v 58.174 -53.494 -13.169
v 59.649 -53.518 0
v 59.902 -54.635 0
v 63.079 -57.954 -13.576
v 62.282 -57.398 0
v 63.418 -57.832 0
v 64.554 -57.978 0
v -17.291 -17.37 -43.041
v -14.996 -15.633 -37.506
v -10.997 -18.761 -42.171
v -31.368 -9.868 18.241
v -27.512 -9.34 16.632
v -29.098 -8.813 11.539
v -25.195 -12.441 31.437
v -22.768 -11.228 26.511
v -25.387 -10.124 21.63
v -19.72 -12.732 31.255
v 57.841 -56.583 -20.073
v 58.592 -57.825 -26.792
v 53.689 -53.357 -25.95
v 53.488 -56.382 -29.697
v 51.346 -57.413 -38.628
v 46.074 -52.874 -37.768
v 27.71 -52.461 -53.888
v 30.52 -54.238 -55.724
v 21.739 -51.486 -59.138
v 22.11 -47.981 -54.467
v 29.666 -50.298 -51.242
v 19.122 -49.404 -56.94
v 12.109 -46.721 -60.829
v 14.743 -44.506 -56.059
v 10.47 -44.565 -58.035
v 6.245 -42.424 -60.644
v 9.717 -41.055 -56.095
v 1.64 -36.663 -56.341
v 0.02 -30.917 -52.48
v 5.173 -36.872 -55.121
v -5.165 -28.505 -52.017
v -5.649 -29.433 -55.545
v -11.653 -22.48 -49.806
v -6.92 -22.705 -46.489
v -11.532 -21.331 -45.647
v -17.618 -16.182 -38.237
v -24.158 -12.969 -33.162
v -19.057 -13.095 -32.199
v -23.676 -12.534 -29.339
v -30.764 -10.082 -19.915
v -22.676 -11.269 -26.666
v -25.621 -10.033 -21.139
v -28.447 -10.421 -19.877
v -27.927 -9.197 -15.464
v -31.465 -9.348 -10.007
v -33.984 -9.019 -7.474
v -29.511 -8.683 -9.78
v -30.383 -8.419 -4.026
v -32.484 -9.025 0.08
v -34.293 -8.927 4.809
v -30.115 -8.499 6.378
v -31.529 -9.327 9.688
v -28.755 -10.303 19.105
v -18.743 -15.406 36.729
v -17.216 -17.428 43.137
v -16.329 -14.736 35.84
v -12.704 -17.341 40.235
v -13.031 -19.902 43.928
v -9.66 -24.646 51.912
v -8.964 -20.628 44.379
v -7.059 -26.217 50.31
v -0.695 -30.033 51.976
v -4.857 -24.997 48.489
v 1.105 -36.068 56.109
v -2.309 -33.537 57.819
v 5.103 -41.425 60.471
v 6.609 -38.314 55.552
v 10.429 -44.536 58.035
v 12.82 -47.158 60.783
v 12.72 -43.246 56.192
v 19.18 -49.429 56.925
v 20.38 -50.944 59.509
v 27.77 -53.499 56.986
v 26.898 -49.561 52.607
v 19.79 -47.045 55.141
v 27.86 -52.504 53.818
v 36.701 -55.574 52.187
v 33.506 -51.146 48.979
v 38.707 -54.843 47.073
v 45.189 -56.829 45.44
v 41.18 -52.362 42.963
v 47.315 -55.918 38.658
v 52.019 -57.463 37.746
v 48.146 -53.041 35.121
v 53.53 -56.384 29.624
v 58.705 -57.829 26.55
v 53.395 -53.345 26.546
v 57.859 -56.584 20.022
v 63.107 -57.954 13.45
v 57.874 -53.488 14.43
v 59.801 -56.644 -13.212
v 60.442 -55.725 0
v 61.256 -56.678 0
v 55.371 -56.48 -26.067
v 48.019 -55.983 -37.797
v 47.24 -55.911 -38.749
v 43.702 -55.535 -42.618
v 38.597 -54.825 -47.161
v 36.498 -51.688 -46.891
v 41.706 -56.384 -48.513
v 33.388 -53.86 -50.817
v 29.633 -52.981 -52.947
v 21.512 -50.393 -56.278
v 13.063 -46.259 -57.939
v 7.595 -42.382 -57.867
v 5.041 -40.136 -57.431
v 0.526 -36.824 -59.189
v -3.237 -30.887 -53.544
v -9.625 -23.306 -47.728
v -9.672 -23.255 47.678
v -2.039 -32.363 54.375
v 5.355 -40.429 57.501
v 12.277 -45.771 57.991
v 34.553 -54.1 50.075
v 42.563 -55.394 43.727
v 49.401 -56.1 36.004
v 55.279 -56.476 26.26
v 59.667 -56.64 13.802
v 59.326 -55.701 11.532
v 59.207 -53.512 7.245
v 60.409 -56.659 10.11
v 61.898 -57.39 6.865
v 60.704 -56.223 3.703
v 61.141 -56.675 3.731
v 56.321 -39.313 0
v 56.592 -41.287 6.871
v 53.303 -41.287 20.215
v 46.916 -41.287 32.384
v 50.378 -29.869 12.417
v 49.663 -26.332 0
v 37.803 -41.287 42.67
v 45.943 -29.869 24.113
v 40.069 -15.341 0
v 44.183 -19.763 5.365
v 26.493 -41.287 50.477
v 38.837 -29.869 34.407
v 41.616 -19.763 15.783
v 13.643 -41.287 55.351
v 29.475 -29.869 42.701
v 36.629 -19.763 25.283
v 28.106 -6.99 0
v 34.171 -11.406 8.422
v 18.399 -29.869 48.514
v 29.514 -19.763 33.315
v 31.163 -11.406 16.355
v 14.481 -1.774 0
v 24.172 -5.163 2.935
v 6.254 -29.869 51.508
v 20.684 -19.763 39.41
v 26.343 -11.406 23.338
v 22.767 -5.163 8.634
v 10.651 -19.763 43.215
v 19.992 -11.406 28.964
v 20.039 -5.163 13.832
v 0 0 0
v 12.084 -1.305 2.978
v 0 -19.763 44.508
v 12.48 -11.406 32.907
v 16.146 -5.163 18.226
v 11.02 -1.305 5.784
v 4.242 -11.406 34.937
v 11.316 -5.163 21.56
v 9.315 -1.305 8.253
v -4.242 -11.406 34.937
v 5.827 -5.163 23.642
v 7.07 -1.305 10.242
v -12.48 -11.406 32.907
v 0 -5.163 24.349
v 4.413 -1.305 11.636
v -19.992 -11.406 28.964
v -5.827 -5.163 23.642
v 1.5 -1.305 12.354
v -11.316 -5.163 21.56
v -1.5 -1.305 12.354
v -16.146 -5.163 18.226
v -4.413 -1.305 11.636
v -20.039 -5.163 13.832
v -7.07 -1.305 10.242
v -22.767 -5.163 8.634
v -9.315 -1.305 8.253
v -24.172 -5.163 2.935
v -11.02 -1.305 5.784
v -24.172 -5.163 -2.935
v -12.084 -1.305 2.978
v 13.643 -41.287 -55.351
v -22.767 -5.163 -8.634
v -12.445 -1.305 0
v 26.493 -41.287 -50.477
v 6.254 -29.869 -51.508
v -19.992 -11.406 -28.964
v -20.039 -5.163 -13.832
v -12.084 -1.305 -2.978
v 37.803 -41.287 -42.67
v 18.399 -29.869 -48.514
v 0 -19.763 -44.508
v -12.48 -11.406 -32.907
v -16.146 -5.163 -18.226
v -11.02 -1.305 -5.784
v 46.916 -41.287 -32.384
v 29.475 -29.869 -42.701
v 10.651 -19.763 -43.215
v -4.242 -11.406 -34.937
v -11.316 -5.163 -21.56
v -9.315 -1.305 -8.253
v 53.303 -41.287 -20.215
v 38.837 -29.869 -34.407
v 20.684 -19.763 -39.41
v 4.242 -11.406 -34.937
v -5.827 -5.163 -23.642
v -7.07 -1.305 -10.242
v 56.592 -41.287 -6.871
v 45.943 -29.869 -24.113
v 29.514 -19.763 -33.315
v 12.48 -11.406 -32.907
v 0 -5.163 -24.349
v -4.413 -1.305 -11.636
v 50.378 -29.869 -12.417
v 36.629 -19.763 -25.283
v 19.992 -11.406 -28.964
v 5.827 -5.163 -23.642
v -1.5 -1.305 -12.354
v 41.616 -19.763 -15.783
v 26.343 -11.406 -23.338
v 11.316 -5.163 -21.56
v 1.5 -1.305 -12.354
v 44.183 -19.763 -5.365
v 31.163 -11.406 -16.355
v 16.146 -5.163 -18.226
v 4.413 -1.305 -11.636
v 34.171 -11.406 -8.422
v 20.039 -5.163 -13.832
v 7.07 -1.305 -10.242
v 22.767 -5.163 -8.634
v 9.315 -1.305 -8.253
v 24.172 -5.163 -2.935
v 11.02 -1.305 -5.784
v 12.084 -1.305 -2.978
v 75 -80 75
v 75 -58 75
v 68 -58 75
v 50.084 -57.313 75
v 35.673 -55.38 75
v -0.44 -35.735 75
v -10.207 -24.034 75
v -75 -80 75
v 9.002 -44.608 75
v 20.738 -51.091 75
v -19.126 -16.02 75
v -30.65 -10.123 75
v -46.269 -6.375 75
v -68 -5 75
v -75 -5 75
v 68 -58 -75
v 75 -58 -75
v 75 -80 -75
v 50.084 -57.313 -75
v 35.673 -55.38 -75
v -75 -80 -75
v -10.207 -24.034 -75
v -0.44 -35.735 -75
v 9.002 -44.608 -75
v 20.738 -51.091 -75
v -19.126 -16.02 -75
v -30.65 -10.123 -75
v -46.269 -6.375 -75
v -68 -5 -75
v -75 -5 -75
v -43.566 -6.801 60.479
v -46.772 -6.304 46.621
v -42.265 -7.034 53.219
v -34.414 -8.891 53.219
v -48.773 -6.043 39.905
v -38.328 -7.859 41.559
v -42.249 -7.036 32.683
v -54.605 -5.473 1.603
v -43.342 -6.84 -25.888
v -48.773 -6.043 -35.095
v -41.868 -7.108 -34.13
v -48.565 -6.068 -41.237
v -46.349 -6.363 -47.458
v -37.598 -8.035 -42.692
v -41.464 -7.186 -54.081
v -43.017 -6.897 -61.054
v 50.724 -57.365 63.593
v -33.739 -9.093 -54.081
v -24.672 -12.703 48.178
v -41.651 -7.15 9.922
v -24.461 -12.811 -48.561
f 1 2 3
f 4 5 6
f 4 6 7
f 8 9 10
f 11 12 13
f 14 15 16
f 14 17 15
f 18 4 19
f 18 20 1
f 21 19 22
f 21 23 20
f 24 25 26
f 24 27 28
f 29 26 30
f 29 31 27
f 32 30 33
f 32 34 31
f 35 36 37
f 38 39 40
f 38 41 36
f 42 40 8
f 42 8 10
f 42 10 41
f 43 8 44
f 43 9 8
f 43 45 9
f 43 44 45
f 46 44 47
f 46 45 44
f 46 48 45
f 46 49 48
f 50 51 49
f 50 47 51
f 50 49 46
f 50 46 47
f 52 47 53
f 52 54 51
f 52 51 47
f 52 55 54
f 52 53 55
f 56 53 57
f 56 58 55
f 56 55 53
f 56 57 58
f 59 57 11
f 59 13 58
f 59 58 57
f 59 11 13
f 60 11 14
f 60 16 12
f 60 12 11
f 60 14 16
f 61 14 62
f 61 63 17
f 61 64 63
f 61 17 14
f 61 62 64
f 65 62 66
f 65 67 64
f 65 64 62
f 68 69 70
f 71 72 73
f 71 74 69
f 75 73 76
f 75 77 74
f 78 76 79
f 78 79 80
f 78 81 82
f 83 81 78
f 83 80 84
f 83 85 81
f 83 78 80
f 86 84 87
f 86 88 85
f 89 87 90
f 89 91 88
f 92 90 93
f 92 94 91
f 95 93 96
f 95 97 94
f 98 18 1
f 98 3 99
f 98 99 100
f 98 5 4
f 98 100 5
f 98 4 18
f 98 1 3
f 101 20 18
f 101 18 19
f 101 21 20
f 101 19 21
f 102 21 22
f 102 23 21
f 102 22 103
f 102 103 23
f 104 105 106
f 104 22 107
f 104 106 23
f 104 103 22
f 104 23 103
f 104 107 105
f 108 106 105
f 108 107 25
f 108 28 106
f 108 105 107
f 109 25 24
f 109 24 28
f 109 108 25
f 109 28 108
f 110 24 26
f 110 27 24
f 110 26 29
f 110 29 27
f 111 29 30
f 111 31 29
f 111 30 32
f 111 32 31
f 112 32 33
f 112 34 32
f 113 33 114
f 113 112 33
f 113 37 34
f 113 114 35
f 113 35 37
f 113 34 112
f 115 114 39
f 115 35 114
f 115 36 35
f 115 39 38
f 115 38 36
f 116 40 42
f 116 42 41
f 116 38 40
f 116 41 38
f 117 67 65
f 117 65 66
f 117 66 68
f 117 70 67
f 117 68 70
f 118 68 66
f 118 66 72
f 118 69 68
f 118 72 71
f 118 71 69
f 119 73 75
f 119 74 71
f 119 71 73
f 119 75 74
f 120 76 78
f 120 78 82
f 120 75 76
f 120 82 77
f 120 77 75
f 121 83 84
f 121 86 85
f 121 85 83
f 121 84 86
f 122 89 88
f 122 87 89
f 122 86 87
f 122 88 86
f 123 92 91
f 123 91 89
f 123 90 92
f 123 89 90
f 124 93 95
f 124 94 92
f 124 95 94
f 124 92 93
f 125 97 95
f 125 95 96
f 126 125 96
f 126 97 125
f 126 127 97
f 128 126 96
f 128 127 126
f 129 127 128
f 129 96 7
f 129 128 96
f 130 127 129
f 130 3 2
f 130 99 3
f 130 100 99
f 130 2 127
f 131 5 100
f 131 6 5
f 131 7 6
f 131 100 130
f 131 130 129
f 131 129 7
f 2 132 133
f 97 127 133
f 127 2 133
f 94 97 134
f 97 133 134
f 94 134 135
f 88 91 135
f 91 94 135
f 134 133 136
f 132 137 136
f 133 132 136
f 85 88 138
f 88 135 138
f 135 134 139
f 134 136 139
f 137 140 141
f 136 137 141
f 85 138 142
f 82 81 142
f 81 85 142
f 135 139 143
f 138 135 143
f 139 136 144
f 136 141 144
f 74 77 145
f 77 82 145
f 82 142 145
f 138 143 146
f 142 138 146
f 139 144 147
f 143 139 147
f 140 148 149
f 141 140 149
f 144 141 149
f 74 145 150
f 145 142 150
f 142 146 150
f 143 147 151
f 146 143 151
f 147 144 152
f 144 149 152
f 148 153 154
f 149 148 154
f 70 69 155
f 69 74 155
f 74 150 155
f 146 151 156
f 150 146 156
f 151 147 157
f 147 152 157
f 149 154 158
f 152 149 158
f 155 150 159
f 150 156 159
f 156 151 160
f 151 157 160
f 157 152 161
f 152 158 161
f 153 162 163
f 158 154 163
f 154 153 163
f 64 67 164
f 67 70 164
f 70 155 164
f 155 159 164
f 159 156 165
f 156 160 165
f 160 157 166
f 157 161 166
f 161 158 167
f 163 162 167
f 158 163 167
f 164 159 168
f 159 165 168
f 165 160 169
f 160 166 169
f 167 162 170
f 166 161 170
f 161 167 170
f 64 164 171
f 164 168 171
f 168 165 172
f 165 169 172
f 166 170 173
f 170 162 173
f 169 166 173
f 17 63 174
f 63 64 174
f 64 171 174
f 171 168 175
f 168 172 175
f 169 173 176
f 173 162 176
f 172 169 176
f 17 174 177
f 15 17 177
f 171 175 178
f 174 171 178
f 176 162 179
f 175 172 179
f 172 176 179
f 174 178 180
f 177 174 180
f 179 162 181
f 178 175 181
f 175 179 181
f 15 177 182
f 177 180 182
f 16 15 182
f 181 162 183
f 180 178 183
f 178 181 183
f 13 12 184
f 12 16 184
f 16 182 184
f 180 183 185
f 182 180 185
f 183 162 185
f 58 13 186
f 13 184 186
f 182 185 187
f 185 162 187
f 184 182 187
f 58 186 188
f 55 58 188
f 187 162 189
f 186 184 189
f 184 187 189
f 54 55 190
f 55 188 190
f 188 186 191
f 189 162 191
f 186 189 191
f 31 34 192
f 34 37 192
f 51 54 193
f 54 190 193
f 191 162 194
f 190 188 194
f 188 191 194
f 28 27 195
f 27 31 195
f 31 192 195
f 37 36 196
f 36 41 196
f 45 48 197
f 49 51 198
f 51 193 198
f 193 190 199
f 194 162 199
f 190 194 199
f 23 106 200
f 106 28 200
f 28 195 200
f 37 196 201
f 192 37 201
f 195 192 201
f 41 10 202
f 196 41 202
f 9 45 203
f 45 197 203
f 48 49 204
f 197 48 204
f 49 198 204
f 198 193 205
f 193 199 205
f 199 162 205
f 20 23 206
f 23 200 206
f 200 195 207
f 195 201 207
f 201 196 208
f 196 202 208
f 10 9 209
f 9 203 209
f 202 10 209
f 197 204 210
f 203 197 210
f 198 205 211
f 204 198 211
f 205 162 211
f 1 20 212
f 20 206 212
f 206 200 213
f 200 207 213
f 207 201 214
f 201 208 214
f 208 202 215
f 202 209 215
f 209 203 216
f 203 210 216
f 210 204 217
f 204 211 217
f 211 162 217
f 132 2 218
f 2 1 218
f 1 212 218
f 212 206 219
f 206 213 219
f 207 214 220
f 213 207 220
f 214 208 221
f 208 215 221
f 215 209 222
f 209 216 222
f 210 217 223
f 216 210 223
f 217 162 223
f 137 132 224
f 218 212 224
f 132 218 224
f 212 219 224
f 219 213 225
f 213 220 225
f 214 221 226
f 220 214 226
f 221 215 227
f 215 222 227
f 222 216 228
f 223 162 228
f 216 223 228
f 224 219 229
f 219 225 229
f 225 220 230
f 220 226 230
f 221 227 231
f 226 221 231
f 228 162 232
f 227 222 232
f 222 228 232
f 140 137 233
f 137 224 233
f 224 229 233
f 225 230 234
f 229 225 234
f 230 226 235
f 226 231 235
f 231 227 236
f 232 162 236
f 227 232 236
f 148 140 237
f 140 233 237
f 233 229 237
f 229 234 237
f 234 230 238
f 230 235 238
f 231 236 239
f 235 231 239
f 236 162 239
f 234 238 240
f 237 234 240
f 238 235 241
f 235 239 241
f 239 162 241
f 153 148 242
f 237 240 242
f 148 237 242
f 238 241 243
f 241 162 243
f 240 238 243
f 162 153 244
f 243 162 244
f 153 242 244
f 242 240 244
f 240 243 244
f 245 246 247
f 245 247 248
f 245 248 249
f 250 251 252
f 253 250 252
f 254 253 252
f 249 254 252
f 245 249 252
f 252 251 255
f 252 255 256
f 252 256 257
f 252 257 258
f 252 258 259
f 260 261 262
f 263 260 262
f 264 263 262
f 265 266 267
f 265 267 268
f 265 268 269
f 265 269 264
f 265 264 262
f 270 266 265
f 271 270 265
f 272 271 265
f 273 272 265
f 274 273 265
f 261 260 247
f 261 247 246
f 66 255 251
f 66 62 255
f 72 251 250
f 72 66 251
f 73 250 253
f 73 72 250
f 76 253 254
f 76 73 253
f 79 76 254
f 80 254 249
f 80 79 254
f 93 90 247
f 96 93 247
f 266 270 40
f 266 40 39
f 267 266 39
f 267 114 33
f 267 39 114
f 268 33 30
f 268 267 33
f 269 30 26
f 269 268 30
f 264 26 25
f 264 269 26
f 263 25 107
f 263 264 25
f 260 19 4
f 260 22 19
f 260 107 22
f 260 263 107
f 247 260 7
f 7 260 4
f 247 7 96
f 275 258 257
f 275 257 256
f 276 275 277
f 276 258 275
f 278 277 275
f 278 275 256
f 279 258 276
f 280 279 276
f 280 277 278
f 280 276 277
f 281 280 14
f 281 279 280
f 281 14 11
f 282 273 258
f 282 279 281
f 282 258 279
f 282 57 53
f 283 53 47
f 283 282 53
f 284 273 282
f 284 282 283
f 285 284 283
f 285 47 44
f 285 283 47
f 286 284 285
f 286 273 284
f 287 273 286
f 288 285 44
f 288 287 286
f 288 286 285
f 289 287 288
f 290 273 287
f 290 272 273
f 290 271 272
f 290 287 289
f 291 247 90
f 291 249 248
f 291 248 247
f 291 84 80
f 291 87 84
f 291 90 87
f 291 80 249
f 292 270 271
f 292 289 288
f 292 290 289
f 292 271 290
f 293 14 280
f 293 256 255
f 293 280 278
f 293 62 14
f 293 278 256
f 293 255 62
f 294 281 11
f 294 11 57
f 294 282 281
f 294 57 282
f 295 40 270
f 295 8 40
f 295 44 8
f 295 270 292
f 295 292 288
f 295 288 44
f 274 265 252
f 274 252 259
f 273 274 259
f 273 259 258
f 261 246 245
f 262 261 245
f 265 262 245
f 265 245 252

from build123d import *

# Parameters (mm, degrees)
EXTRUDE1_DEPTH      = 75
EXTRUDE1_DEPTH_BACK = 75
FILLET2_R           = 5


with BuildPart() as part:
    # Sketch1 → Extrude1 (new, two sides: drawn at the far end of the back side and taken through both)
    with BuildSketch(Plane.XY.offset(-EXTRUDE1_DEPTH_BACK)):
        with BuildLine():
            Line((68, -58), (75, -58))
            Line((75, -58), (75, -80))
            Line((75, -80), (-75, -80))
            Line((-75, -80), (-75, -5))
            Line((-75, -5), (-68, -5))
            add(Edge.make_bspline(
                [(-68, -5), (19.719434236, -5), (-30.32506556, -58), (68, -58)],
                knots=[0, 0, 0, 0, 1, 1, 1, 1], degree=3))
        make_face()
    extrude(amount=EXTRUDE1_DEPTH + EXTRUDE1_DEPTH_BACK)

    # Sketch2 → Revolve1 (revolve)
    with BuildSketch(Plane.XY):
        with BuildLine():
            Line((0, -60), (60, -60))
            ThreePointArc((60, -60), (42.426406871, -17.573593129), (0, 0))
            Line((0, 0), (0, -60))
        make_face()
    revolve(axis=Axis((0, 11.185160428, 0), (0, -1, 0)))

    # Fillet2
    fillet2_edges = [part.edges().sort_by_distance(p)[0] for p in [
        (9.137379972, -44.707678169, -57.294442834),
    ]]
    fillet(fillet2_edges, radius=FILLET2_R)


solid = part.part
